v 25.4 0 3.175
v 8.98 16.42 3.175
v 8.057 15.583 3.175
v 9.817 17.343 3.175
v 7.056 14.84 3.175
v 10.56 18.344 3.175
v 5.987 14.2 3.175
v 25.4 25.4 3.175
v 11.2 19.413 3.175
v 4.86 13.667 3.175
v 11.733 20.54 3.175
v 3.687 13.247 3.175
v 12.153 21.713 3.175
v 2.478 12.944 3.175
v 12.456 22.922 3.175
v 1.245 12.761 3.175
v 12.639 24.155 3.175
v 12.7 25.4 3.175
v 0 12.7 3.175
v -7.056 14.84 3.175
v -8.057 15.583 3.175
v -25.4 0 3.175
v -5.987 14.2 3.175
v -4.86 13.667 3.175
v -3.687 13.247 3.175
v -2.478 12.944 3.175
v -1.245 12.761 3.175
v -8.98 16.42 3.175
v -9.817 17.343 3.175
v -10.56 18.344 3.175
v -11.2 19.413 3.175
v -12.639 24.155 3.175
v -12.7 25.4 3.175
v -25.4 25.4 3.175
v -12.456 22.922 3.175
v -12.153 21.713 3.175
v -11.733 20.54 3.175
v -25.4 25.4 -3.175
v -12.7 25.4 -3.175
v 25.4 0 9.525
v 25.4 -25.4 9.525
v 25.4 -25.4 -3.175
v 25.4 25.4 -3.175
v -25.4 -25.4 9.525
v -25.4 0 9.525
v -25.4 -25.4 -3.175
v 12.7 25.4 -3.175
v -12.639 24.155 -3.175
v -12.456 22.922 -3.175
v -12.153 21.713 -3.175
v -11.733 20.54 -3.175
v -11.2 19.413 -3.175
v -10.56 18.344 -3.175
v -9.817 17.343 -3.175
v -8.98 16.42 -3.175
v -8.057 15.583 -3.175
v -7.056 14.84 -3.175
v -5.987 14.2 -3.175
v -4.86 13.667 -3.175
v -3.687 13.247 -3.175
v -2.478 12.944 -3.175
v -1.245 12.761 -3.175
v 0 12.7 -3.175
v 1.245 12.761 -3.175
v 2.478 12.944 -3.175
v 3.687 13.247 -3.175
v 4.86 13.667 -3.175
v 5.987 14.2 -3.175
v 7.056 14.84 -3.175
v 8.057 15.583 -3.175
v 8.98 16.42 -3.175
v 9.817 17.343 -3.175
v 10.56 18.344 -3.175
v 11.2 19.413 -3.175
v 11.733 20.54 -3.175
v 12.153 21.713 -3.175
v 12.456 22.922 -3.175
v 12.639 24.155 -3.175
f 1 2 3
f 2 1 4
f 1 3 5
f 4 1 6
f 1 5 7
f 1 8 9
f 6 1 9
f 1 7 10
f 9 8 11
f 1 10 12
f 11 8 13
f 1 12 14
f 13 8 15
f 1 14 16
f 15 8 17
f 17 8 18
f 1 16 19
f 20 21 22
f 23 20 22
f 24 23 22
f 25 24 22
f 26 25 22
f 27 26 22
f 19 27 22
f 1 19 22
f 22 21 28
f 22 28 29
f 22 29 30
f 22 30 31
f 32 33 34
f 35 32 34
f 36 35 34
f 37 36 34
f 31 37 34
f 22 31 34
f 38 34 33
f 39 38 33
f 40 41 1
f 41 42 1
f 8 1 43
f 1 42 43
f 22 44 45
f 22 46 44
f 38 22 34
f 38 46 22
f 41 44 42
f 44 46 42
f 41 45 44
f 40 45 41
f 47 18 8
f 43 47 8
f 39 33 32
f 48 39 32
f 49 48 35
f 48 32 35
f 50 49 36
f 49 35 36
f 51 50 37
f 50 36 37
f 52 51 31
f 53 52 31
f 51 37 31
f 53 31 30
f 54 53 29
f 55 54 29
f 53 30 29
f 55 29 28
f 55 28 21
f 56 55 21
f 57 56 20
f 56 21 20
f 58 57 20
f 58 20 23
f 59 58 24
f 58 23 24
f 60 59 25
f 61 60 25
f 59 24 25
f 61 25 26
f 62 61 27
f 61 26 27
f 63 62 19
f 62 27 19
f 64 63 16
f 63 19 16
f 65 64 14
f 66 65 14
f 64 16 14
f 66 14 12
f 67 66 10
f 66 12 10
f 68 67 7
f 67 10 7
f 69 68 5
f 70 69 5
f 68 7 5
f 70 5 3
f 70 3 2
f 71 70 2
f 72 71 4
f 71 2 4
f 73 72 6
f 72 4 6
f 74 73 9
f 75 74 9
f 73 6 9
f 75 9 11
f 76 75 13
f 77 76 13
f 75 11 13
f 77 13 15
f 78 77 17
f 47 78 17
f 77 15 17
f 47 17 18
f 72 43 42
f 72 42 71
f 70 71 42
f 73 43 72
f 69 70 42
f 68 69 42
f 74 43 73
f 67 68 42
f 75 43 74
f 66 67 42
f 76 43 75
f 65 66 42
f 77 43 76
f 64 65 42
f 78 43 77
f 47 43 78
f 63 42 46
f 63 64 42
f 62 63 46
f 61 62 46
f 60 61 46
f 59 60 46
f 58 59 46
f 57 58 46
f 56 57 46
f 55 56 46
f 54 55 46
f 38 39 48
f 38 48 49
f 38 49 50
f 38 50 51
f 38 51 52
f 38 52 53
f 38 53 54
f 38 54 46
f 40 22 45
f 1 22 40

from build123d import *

# Parameters (mm, degrees)
BOSS_EXTRUDE1_DEPTH = 3.175
SKETCH2_W           = 50.8
SKETCH2_H           = 25.4
BOSS_EXTRUDE2_DEPTH = 6.35


with BuildPart() as part:
    # Sketch1 → Boss-Extrude1 (new, symmetric)
    with BuildSketch(Plane.XY):
        with BuildLine():
            Line((12.7, 25.4), (25.4, 25.4))
            Line((25.4, 25.4), (25.4, -25.4))
            Line((25.4, -25.4), (-25.4, -25.4))
            Line((-25.4, -25.4), (-25.4, 25.4))
            Line((-25.4, 25.4), (-12.7, 25.4))
            ThreePointArc((-12.7, 25.4), (0, 12.7), (12.7, 25.4))
        make_face()
    extrude(amount=BOSS_EXTRUDE1_DEPTH, both=True)

    # Sketch2 → Boss-Extrude2 (add)
    with BuildSketch(Plane.XY.offset(3.175)):
        with Locations((0, -12.7)):
            Rectangle(SKETCH2_W, SKETCH2_H)
    extrude(amount=BOSS_EXTRUDE2_DEPTH)


solid = part.part
